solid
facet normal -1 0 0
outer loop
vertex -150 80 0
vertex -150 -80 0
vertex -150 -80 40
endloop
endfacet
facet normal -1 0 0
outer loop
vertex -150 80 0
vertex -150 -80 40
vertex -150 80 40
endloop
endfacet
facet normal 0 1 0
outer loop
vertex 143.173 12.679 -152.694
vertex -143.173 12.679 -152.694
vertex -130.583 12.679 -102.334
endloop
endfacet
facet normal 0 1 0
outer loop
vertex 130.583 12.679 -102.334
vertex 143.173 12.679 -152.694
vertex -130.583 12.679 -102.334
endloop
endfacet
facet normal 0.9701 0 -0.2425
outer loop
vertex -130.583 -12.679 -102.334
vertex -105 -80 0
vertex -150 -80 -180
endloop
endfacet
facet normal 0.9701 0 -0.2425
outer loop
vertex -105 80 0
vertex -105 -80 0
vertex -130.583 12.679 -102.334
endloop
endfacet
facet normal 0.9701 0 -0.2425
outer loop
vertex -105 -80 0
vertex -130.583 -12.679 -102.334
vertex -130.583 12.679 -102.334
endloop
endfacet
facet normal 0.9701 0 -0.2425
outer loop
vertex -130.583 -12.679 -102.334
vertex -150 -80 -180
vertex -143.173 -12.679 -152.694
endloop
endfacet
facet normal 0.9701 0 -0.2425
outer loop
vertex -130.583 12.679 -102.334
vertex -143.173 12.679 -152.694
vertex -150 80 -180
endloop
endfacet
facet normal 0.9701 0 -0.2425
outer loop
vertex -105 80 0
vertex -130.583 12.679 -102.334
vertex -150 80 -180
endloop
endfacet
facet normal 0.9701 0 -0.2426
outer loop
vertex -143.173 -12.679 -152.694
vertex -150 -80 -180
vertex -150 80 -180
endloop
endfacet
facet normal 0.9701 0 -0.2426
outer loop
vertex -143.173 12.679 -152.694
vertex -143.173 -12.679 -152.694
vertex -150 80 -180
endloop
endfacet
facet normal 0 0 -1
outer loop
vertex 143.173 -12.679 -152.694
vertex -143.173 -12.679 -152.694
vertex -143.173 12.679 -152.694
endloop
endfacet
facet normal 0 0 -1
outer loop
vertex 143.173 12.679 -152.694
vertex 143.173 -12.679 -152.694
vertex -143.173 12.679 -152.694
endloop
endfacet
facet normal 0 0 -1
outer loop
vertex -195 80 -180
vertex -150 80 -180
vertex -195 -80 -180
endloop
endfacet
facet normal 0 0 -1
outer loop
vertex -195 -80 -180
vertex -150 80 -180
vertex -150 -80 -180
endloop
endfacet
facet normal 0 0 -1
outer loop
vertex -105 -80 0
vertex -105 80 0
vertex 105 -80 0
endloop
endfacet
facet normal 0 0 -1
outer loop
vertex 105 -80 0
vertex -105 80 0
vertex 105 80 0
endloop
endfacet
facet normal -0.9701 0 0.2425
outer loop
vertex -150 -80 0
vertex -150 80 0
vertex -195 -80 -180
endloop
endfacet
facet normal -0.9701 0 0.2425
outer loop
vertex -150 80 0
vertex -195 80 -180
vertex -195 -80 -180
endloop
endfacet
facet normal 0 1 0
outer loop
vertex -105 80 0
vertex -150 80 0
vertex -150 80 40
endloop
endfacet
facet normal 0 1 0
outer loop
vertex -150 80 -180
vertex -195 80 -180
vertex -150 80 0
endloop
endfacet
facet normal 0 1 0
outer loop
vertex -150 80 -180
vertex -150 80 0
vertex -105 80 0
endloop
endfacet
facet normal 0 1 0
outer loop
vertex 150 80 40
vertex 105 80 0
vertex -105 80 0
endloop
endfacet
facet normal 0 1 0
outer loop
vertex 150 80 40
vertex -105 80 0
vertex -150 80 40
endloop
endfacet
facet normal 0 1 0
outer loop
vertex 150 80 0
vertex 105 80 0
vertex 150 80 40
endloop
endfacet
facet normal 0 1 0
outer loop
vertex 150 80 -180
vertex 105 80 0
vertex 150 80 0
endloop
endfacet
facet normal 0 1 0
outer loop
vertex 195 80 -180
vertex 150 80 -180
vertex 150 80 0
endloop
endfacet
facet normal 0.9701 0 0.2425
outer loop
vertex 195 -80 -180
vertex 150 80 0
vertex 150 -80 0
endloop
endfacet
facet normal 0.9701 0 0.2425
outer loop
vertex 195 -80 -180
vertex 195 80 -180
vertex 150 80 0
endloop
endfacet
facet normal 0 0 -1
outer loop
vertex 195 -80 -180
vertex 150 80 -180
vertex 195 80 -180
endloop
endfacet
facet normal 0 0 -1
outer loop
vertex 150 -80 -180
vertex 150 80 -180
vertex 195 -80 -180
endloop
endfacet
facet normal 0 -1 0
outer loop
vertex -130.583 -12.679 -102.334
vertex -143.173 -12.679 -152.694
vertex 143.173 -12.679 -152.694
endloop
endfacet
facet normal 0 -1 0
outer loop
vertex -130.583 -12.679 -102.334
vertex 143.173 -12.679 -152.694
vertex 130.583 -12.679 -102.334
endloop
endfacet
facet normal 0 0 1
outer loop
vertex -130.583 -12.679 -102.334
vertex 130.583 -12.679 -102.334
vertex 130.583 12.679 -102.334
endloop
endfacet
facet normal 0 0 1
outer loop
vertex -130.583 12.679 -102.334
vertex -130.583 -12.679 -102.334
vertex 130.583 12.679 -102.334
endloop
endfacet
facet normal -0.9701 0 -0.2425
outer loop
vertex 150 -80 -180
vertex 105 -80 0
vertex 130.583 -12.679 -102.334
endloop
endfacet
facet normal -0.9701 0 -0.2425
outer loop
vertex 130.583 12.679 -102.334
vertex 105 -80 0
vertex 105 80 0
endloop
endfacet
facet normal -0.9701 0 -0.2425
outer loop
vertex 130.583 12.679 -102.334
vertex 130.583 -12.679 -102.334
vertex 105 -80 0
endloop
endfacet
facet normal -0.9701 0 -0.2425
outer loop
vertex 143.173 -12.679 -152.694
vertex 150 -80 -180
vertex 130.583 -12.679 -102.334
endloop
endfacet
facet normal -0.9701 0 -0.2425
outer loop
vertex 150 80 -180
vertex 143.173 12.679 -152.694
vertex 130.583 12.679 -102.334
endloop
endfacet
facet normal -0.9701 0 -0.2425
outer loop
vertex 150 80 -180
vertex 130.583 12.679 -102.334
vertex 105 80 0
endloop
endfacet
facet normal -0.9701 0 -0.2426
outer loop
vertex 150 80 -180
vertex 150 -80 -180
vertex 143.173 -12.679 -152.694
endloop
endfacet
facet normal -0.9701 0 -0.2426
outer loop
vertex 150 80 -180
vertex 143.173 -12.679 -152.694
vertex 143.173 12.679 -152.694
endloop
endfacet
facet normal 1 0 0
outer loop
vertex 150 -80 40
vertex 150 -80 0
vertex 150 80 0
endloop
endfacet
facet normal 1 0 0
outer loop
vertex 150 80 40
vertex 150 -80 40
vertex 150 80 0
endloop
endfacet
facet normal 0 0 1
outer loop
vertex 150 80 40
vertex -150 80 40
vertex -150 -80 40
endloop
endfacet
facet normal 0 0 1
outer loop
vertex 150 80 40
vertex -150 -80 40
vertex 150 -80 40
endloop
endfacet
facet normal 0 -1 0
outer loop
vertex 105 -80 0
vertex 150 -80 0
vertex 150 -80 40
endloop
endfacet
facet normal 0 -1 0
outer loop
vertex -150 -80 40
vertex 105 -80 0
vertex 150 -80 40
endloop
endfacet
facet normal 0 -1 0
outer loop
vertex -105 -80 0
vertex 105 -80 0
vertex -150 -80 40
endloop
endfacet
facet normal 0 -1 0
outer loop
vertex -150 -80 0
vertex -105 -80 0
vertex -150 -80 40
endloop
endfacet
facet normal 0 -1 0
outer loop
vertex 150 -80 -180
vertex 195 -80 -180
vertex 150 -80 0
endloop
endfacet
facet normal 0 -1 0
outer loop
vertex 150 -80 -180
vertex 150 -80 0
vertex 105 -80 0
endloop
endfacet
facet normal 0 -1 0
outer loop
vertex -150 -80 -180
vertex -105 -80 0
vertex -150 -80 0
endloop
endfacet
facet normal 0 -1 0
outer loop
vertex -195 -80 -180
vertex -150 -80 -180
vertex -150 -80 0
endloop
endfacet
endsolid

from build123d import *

# Parameters (mm, degrees)
F0_W          = 300
F0_H          = 160
F1_DEPTH      = 40
F4_W          = 45
F4_H          = 160
F3_W          = 45
F3_H          = 160
F7_W          = 25.3585465252
F7_H          = 50.359621644
F8_DEPTH      = 144.1733793765
F8_DEPTH_BACK = 144.1733793765


with BuildPart() as f1:
    # F0 (on Top) → F1 (new body)
    with BuildSketch(Plane.XY):
        Rectangle(F0_W, F0_H)
    extrude(amount=F1_DEPTH)

    # F6: F5 across plane


with BuildPart() as f5:
    # F4 (on face) → F5 section 0
    with BuildSketch(Plane(origin=(0, 0, 0), x_dir=(1, 0, 0), z_dir=(0, 0, -1))):
        with Locations((127.5, 0)):
            Rectangle(F4_W, F4_H)
    # F3 (on offset) → F5 section 1
    with BuildSketch(Plane(origin=(0, 0, -180), x_dir=(1, 0, 0), z_dir=(0, 0, -1))):
        with Locations((172.5, 0)):
            Rectangle(F3_W, F3_H)
    loft()


with BuildPart() as f1_1:
    add(f1.part)
    add(f5.part.mirror(Plane.YZ))


    add(f5.part)  # F8 merges F5
    # F7 (on Right) → F8 (join, two sides)
    with BuildSketch(Plane.YZ) as f8_sk:
        with Locations((0, -127.5137066841)):
            Rectangle(F7_W, F7_H)
    extrude(amount=F8_DEPTH)
    extrude(f8_sk.sketch, amount=-F8_DEPTH_BACK)


solid = f1_1.part
